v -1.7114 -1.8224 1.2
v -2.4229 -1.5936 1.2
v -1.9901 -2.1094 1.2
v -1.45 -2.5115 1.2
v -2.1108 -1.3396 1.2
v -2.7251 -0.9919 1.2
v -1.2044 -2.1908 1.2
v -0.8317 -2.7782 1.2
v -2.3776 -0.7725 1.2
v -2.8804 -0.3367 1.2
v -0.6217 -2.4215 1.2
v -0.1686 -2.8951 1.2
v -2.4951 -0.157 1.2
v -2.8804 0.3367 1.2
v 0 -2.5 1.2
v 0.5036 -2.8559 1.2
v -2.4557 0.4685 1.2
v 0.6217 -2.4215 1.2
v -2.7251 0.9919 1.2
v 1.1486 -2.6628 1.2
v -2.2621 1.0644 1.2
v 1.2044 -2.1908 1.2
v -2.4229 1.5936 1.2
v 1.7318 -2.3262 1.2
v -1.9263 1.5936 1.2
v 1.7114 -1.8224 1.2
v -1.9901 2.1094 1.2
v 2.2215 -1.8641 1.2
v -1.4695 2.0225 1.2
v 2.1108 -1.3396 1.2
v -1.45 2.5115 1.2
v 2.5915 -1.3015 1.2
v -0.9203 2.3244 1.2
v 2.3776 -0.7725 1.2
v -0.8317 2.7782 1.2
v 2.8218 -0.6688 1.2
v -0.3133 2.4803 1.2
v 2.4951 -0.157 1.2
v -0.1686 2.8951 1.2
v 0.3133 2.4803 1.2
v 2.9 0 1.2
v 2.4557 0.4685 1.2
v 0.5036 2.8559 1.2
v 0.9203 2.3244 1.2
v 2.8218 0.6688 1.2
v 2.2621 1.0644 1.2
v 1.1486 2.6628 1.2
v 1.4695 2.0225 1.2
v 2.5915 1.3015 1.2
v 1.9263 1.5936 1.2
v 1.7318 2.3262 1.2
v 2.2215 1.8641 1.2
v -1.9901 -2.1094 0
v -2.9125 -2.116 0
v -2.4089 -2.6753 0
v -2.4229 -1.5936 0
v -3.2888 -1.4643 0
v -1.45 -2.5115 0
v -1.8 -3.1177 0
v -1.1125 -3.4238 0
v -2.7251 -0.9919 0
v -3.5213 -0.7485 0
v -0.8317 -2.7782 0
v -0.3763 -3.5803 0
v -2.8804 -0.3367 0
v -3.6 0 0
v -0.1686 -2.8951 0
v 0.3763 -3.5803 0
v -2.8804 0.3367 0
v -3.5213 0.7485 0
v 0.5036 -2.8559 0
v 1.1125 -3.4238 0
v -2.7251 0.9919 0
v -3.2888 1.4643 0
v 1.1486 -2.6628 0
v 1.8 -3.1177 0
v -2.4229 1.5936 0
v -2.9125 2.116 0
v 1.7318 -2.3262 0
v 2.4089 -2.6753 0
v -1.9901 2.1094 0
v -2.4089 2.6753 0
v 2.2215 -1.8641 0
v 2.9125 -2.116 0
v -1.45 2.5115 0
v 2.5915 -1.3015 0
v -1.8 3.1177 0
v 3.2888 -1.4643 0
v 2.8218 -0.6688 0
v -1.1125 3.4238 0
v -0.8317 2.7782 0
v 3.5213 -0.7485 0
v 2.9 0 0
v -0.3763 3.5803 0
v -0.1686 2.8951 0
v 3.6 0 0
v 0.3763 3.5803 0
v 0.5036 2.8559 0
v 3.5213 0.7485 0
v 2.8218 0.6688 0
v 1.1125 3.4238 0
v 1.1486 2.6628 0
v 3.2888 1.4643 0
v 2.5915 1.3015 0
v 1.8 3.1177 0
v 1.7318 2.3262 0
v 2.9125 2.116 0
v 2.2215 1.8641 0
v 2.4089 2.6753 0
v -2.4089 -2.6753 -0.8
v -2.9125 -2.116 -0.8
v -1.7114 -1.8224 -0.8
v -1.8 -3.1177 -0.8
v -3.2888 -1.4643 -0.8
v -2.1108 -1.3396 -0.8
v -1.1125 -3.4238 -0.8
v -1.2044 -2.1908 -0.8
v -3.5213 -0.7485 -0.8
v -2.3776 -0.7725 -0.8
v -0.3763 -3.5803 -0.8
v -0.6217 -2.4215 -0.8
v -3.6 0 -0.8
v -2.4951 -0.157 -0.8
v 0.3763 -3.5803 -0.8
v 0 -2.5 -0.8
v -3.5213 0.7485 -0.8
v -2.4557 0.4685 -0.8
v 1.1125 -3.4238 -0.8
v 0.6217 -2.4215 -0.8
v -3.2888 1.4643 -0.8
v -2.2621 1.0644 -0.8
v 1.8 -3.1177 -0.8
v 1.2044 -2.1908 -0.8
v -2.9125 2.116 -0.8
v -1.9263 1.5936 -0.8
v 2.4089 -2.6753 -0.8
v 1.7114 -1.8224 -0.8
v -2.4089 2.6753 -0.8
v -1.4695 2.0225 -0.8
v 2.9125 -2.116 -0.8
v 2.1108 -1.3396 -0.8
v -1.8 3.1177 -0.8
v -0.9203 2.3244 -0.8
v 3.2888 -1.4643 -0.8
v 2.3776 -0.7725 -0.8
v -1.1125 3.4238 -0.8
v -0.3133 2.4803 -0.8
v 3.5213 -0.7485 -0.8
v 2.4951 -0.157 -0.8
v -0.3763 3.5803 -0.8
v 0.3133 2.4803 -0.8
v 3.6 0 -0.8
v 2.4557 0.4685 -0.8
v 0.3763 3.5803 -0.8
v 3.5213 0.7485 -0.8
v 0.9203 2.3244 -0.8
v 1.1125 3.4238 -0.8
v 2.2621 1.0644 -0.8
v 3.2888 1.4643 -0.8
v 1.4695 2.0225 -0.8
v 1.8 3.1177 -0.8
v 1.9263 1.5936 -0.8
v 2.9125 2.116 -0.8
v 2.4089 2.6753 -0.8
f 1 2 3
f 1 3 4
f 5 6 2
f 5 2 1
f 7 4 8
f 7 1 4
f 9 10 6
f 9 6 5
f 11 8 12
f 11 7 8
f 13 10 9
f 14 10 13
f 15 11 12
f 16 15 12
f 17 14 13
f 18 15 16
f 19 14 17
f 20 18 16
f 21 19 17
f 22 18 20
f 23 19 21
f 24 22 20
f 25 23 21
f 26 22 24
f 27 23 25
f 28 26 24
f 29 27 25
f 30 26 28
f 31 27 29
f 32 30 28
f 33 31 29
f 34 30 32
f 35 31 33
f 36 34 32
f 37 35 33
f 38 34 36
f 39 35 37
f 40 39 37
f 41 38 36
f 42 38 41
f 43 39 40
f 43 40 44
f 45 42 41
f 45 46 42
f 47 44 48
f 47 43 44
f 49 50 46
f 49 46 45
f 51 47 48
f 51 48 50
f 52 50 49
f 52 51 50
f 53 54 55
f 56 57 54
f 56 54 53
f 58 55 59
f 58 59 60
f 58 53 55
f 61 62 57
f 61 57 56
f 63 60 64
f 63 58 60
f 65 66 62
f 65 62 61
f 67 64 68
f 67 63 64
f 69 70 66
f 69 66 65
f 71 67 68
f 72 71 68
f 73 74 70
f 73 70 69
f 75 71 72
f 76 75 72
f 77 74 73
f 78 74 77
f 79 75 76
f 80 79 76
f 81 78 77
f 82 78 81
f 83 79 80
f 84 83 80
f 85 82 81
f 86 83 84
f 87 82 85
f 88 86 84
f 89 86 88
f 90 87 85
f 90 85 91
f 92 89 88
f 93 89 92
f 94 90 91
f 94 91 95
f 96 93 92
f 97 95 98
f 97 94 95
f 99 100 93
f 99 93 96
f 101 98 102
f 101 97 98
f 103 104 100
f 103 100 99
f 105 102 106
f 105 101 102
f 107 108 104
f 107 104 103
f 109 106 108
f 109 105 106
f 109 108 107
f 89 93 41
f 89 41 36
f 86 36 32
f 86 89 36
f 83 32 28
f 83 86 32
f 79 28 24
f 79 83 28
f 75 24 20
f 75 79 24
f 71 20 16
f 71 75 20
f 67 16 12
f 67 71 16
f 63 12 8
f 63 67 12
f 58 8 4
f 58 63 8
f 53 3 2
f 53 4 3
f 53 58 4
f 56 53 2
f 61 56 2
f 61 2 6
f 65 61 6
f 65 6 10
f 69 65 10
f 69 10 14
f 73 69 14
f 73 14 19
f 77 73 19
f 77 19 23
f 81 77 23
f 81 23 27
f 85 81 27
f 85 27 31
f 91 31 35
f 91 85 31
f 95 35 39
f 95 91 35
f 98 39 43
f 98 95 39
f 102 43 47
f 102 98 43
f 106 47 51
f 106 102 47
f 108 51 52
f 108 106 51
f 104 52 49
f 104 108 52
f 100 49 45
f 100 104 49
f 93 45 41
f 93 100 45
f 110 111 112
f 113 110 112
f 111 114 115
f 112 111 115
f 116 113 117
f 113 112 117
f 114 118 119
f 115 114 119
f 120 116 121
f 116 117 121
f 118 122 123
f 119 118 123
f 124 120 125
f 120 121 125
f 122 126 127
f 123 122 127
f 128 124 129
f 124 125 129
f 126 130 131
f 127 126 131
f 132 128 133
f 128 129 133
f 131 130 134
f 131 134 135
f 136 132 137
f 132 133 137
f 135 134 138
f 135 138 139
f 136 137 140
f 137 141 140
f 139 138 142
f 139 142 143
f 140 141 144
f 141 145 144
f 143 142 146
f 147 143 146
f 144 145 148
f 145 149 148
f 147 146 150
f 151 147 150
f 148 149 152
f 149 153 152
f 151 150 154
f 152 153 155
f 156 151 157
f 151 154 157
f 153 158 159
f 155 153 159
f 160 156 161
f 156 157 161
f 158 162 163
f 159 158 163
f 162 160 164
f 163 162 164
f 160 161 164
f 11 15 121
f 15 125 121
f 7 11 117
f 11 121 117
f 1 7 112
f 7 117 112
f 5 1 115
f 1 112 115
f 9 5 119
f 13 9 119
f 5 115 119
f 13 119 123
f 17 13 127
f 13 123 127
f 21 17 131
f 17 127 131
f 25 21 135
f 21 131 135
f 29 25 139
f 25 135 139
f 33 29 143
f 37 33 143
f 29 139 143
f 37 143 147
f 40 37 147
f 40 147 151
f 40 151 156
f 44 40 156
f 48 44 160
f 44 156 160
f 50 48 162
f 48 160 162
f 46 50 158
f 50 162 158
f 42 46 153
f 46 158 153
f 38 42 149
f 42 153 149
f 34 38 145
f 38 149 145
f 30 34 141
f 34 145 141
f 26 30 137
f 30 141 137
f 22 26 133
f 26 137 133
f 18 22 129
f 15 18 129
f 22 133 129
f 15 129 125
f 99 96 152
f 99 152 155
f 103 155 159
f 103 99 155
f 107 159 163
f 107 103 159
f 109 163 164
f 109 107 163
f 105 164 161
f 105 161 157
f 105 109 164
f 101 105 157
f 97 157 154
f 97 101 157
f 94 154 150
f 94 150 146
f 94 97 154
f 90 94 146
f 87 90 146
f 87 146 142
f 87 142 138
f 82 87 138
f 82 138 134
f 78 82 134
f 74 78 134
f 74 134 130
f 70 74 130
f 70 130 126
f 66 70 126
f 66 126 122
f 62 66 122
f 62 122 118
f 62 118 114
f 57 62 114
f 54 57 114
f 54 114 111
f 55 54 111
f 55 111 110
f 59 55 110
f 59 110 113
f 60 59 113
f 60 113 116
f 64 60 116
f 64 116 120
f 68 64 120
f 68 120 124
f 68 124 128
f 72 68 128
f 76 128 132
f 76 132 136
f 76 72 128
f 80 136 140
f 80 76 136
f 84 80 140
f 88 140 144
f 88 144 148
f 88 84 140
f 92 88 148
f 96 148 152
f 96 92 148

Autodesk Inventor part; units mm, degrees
ref_plane "YZ Plane" through (0, 0, 0) normal (1, 0, 0) x (0, 1, 0)
ref_plane "XZ Plane" through (0, 0, 0) normal (0, 1, 0) x (-1, 0, 0)
ref_plane "XY Plane" through (0, 0, 0) normal (0, 0, 1) x (1, 0, 0)
sketch "Sketch1" plane through (0, 0, 0) normal (0, 0, 1) x (1, 0, 0)
  circle A0 centre (0, 0) radius 2.9
  dimension "d0" = 5.8
extrude "Extrusion1" add sketch "Sketch1" along normal blind 1.2
sketch "Sketch2" plane through (0, 0, 0) normal (0, 0, 1) x (1, 0, 0)
  circle A0 centre (0, 0) radius 2.9 projected
  circle A1 centre (0, 0) radius 3.6
  dimension "d3" = 7.2
extrude "Extrusion2" add sketch "Sketch2" against normal blind 0.8 contours A0 | A1
sketch "Sketch3" plane through (0, 0, 1.2) normal (0, 0, 1) x (1, 0, 0)
  point P0 (0, 0)
hole "Hole1" at (0, 0, 1.2) direction (0, 0, -1) diameter 5 end through all
properties part number "LabyrinthSealInner"
